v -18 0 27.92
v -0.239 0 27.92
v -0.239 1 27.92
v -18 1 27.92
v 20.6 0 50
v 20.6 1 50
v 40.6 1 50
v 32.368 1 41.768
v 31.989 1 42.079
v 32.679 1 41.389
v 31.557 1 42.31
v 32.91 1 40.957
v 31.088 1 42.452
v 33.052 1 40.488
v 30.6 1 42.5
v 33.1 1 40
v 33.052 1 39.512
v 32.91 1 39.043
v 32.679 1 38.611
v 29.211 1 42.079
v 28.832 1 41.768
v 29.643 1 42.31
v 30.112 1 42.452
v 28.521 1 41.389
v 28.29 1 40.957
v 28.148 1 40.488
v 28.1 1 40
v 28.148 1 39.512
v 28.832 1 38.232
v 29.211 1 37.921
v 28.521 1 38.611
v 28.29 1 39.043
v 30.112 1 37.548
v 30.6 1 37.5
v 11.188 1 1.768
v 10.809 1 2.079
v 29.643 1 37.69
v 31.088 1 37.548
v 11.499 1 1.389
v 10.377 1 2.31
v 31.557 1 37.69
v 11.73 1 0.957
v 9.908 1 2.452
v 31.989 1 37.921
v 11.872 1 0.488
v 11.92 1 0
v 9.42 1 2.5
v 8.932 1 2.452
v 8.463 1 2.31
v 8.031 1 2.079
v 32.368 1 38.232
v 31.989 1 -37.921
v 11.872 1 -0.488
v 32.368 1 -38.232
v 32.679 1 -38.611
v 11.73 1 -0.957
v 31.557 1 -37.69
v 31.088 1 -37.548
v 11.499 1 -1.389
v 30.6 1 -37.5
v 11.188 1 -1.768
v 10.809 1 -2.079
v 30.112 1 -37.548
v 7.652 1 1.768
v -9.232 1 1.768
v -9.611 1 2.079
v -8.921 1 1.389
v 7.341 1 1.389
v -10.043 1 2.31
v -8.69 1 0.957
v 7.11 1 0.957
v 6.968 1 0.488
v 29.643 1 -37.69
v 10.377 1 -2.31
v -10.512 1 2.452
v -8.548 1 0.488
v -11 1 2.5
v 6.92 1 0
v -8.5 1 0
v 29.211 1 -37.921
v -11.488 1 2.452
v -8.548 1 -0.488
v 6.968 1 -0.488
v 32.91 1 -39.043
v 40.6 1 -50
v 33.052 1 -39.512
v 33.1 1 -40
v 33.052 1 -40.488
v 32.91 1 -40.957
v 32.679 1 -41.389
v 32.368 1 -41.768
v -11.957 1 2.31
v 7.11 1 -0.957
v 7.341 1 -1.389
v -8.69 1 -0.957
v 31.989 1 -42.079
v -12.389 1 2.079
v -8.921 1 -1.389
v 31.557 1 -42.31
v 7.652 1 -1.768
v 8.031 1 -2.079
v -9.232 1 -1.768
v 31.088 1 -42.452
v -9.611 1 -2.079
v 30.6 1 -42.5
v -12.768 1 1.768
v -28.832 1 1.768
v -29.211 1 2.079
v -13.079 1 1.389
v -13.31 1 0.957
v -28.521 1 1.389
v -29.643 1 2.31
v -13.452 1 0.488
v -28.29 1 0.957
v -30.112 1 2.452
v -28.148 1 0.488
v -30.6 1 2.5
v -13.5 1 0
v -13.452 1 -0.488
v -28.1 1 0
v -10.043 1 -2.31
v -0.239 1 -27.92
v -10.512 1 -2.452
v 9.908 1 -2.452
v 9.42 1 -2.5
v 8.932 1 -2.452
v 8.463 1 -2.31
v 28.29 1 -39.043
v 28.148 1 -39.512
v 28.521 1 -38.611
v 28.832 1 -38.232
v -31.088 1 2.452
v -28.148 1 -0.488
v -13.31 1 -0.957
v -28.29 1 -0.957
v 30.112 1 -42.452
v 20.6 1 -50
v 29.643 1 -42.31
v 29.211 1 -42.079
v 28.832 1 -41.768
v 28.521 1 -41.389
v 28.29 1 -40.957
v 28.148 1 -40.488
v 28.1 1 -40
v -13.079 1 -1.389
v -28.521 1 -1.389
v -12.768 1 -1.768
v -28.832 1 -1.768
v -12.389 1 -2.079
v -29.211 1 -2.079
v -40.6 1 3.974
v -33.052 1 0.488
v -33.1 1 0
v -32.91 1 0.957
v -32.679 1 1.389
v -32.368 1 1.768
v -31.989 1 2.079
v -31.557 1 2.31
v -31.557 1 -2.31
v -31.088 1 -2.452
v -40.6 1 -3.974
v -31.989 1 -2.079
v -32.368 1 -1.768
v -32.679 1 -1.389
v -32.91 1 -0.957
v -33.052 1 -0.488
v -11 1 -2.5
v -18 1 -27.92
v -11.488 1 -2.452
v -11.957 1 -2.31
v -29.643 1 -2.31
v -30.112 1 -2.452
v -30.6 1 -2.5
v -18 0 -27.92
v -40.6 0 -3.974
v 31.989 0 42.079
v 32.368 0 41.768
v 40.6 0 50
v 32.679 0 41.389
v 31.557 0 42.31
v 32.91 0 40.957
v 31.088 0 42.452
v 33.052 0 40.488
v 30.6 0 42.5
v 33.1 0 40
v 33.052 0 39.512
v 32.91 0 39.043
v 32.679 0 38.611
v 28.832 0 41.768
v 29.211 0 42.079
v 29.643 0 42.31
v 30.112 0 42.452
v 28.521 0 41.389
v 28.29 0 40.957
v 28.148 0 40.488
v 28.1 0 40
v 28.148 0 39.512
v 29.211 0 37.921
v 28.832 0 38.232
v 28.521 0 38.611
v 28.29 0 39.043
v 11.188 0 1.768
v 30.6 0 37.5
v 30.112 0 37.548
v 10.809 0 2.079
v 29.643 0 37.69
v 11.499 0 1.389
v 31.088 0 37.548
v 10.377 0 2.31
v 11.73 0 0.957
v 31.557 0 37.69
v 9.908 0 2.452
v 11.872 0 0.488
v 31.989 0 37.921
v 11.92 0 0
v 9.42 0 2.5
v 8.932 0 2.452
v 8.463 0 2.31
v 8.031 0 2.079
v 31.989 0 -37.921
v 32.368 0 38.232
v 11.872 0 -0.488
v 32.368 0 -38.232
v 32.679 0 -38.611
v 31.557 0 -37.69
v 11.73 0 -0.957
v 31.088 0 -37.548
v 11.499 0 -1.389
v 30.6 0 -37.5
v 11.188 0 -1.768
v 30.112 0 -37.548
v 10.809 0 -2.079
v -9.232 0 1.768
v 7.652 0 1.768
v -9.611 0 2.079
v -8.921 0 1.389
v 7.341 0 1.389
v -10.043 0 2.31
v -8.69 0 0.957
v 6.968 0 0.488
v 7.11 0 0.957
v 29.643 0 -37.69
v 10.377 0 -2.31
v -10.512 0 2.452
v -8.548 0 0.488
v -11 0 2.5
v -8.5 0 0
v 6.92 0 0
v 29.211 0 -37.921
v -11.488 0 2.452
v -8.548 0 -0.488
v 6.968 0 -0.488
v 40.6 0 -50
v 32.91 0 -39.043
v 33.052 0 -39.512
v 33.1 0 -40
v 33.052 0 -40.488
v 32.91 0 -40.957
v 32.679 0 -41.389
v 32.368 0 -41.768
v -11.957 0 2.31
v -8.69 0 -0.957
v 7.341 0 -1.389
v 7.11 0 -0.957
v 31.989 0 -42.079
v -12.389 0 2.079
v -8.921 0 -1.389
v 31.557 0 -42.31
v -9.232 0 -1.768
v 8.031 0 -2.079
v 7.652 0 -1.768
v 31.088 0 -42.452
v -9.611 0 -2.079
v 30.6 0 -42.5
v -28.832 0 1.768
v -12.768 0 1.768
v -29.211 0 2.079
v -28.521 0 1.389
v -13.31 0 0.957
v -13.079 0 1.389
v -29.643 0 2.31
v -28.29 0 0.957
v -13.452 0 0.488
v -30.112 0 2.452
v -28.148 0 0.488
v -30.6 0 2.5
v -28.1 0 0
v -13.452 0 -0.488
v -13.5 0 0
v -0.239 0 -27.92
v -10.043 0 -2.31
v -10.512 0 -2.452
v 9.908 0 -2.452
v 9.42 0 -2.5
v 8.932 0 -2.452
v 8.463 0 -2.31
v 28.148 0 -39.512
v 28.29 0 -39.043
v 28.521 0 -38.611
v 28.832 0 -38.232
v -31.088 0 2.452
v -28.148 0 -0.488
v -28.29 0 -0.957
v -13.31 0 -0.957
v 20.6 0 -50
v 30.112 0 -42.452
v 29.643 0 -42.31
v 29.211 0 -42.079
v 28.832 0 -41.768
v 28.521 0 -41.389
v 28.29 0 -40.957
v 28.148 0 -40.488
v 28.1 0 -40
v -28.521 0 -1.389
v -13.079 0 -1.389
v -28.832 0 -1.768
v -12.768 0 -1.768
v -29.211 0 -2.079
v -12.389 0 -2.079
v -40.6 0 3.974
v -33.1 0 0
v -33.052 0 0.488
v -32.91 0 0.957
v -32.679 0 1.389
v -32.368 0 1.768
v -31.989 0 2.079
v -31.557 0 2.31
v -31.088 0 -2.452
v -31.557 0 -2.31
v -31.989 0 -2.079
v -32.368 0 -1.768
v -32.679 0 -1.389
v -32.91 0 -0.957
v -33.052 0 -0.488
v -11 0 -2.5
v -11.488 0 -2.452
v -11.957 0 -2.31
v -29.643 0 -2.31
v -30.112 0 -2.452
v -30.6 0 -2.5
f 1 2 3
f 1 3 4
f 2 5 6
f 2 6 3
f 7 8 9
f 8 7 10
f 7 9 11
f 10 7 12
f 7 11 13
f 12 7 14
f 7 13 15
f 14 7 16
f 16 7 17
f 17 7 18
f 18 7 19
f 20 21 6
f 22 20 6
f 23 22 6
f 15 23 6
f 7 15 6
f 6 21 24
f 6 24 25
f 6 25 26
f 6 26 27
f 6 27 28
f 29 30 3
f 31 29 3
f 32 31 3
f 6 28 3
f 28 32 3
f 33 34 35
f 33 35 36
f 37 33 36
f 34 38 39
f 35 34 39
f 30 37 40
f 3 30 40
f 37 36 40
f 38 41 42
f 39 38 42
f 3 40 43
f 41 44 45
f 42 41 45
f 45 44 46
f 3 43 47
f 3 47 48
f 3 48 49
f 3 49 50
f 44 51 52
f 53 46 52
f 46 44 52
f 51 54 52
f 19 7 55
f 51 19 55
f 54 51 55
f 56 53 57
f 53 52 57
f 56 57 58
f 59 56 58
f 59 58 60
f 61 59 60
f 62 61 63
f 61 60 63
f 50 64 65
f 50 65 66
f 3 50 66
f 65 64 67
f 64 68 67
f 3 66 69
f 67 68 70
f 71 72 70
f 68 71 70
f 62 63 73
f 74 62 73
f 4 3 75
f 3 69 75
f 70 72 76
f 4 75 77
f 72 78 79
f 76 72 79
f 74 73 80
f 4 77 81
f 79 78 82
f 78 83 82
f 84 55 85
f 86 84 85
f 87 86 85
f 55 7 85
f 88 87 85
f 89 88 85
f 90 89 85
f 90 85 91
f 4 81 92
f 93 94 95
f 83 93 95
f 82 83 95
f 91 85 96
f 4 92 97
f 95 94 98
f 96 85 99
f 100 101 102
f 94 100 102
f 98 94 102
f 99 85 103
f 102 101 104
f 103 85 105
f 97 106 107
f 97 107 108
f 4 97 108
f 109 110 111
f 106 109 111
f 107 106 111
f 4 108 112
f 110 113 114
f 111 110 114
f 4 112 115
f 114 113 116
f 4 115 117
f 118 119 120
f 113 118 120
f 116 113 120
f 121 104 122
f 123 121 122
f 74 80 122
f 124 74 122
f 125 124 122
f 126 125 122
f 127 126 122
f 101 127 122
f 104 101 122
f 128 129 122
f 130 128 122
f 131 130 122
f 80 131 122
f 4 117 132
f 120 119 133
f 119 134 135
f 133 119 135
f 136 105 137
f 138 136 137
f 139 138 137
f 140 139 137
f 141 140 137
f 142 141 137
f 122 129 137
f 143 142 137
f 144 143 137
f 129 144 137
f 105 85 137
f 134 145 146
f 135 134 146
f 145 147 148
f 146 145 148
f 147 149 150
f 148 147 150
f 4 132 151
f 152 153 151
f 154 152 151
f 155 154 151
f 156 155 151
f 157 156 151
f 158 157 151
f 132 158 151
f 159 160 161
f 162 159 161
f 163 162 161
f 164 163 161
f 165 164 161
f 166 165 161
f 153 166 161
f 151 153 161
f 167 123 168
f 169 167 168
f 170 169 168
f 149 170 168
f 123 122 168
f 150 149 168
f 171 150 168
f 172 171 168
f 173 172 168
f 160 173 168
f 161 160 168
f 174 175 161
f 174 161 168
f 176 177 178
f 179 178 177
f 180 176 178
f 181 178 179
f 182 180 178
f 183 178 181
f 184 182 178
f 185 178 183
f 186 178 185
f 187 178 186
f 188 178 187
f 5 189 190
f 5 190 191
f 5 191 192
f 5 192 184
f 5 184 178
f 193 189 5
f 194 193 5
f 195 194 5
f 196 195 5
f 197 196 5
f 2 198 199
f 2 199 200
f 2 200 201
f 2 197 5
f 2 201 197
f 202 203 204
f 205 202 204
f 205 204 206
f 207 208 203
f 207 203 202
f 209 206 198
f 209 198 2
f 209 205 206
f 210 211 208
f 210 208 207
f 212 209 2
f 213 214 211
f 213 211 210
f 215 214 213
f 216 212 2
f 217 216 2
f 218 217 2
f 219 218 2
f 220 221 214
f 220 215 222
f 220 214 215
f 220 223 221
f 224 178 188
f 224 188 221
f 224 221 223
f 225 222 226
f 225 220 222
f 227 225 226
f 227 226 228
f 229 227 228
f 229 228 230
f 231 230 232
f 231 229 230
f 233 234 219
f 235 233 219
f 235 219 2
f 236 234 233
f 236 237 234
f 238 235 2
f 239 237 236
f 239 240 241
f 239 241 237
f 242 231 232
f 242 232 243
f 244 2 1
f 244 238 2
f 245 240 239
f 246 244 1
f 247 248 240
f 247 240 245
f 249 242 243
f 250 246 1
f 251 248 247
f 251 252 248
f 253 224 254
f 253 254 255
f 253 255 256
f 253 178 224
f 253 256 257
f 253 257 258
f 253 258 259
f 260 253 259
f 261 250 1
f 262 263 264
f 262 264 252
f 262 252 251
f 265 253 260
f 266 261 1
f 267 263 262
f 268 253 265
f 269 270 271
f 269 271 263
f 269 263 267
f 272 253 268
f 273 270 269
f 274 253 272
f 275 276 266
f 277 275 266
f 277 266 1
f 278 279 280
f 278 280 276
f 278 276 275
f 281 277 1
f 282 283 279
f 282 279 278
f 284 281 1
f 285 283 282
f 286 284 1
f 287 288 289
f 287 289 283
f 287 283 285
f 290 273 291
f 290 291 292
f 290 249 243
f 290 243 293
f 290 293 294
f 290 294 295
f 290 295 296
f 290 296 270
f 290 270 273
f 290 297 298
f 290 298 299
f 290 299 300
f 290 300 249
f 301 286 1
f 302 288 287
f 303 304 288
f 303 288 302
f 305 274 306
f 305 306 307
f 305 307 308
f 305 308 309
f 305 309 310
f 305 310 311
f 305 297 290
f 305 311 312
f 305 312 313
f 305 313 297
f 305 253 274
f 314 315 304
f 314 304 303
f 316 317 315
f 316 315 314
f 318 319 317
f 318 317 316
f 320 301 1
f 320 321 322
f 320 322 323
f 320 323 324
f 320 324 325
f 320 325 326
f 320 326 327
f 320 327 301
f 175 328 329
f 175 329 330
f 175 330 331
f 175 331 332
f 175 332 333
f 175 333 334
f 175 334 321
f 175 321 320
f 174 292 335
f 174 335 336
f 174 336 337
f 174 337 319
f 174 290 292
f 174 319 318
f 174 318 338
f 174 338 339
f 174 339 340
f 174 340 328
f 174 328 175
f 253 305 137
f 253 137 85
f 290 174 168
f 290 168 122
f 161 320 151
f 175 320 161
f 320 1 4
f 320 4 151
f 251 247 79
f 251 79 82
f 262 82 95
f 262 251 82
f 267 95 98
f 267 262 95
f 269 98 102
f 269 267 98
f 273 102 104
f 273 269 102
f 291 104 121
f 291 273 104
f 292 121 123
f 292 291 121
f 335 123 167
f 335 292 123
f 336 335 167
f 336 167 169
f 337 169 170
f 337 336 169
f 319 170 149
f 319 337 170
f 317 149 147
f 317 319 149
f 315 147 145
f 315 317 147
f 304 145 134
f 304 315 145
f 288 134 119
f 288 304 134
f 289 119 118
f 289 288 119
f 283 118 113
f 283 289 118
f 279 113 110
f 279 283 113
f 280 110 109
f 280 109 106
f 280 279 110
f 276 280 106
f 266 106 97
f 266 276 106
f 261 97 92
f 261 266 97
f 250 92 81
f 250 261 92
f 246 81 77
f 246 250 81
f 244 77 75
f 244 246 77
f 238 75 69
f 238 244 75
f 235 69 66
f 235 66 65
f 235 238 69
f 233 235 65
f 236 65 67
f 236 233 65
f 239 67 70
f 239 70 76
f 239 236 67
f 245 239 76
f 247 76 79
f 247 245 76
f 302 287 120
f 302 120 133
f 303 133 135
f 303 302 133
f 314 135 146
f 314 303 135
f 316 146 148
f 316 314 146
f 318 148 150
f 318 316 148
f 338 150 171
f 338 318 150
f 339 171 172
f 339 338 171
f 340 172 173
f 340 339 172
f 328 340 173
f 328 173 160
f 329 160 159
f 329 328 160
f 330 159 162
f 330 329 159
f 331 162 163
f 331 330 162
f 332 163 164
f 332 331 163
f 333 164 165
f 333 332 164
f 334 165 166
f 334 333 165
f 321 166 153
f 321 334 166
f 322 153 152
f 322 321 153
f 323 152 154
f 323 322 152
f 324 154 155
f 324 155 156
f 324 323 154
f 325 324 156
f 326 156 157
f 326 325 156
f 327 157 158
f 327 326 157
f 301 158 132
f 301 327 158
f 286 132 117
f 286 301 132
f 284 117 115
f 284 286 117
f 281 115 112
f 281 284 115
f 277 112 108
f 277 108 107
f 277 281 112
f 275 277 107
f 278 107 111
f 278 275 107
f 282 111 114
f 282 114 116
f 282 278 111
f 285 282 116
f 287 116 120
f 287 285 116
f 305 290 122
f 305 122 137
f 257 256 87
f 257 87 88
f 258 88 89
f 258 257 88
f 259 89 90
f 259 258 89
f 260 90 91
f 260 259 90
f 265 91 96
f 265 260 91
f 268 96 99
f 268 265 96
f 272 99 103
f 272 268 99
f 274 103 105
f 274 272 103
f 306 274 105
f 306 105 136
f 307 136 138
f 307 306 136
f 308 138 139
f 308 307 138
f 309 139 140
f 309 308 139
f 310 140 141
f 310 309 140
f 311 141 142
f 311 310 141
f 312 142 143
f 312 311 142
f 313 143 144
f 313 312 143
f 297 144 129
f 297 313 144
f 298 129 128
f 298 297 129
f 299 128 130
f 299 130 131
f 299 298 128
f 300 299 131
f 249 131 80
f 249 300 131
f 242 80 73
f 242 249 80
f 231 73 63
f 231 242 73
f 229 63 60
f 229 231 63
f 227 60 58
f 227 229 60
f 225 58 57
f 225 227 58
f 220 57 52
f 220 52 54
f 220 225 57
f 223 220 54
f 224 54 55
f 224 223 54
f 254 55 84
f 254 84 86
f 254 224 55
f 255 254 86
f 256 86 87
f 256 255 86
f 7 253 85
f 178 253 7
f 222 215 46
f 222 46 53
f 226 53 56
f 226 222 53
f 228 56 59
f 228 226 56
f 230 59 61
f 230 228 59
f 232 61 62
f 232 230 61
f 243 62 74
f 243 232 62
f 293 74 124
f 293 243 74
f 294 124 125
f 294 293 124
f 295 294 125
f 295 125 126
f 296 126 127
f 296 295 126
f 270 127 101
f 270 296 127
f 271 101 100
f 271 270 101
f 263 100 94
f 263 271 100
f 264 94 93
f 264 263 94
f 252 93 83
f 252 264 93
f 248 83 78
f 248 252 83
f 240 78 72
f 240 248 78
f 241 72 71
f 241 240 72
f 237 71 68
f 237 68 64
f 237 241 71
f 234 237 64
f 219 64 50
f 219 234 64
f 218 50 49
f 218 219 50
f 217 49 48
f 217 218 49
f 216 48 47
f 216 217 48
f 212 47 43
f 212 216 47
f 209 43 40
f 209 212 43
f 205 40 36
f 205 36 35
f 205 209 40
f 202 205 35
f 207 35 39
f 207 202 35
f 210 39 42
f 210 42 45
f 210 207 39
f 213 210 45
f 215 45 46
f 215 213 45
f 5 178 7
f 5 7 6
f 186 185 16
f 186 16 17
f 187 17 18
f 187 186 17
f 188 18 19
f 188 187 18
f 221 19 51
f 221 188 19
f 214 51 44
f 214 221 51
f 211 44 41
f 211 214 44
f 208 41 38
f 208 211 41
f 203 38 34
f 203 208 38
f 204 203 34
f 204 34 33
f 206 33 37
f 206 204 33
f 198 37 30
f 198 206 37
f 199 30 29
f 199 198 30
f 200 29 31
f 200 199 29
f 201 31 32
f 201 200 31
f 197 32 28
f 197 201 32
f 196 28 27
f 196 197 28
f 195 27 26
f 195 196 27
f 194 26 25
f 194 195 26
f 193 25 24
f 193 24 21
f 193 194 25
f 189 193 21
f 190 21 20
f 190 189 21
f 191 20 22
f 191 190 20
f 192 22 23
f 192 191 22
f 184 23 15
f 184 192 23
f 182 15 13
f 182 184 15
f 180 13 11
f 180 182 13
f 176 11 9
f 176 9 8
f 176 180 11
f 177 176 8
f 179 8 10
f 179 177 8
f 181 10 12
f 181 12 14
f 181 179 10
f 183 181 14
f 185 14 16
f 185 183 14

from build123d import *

# Parameters (mm, degrees)
SKETCH1_R           = 2.5
BOSS_EXTRUDE1_DEPTH = 1


with BuildPart() as part:
    # Sketch1 → Boss-Extrude1 (new body)
    with BuildSketch(Plane(origin=(0, 0, 0), x_dir=(1, 0, 0), z_dir=(0, 1, 0))):
        Polygon((20.6, 50), (40.6, 50), (40.6, -50), (20.6, -50), (-0.238673257, -27.92), (-18, -27.92), (-40.6, -3.973753814), (-40.6, 3.973753814), (-18, 27.92), (-0.238673257, 27.92), align=None)
        with Locations((-30.6, 0)):
            Circle(SKETCH1_R, mode=Mode.SUBTRACT)
        with Locations((30.6, 40)):
            Circle(SKETCH1_R, mode=Mode.SUBTRACT)
        with Locations((30.6, -40)):
            Circle(SKETCH1_R, mode=Mode.SUBTRACT)
        with Locations((9.42, 0)):
            Circle(SKETCH1_R, mode=Mode.SUBTRACT)
        with Locations((-11, 0)):
            Circle(SKETCH1_R, mode=Mode.SUBTRACT)
    extrude(amount=BOSS_EXTRUDE1_DEPTH)


solid = part.part
